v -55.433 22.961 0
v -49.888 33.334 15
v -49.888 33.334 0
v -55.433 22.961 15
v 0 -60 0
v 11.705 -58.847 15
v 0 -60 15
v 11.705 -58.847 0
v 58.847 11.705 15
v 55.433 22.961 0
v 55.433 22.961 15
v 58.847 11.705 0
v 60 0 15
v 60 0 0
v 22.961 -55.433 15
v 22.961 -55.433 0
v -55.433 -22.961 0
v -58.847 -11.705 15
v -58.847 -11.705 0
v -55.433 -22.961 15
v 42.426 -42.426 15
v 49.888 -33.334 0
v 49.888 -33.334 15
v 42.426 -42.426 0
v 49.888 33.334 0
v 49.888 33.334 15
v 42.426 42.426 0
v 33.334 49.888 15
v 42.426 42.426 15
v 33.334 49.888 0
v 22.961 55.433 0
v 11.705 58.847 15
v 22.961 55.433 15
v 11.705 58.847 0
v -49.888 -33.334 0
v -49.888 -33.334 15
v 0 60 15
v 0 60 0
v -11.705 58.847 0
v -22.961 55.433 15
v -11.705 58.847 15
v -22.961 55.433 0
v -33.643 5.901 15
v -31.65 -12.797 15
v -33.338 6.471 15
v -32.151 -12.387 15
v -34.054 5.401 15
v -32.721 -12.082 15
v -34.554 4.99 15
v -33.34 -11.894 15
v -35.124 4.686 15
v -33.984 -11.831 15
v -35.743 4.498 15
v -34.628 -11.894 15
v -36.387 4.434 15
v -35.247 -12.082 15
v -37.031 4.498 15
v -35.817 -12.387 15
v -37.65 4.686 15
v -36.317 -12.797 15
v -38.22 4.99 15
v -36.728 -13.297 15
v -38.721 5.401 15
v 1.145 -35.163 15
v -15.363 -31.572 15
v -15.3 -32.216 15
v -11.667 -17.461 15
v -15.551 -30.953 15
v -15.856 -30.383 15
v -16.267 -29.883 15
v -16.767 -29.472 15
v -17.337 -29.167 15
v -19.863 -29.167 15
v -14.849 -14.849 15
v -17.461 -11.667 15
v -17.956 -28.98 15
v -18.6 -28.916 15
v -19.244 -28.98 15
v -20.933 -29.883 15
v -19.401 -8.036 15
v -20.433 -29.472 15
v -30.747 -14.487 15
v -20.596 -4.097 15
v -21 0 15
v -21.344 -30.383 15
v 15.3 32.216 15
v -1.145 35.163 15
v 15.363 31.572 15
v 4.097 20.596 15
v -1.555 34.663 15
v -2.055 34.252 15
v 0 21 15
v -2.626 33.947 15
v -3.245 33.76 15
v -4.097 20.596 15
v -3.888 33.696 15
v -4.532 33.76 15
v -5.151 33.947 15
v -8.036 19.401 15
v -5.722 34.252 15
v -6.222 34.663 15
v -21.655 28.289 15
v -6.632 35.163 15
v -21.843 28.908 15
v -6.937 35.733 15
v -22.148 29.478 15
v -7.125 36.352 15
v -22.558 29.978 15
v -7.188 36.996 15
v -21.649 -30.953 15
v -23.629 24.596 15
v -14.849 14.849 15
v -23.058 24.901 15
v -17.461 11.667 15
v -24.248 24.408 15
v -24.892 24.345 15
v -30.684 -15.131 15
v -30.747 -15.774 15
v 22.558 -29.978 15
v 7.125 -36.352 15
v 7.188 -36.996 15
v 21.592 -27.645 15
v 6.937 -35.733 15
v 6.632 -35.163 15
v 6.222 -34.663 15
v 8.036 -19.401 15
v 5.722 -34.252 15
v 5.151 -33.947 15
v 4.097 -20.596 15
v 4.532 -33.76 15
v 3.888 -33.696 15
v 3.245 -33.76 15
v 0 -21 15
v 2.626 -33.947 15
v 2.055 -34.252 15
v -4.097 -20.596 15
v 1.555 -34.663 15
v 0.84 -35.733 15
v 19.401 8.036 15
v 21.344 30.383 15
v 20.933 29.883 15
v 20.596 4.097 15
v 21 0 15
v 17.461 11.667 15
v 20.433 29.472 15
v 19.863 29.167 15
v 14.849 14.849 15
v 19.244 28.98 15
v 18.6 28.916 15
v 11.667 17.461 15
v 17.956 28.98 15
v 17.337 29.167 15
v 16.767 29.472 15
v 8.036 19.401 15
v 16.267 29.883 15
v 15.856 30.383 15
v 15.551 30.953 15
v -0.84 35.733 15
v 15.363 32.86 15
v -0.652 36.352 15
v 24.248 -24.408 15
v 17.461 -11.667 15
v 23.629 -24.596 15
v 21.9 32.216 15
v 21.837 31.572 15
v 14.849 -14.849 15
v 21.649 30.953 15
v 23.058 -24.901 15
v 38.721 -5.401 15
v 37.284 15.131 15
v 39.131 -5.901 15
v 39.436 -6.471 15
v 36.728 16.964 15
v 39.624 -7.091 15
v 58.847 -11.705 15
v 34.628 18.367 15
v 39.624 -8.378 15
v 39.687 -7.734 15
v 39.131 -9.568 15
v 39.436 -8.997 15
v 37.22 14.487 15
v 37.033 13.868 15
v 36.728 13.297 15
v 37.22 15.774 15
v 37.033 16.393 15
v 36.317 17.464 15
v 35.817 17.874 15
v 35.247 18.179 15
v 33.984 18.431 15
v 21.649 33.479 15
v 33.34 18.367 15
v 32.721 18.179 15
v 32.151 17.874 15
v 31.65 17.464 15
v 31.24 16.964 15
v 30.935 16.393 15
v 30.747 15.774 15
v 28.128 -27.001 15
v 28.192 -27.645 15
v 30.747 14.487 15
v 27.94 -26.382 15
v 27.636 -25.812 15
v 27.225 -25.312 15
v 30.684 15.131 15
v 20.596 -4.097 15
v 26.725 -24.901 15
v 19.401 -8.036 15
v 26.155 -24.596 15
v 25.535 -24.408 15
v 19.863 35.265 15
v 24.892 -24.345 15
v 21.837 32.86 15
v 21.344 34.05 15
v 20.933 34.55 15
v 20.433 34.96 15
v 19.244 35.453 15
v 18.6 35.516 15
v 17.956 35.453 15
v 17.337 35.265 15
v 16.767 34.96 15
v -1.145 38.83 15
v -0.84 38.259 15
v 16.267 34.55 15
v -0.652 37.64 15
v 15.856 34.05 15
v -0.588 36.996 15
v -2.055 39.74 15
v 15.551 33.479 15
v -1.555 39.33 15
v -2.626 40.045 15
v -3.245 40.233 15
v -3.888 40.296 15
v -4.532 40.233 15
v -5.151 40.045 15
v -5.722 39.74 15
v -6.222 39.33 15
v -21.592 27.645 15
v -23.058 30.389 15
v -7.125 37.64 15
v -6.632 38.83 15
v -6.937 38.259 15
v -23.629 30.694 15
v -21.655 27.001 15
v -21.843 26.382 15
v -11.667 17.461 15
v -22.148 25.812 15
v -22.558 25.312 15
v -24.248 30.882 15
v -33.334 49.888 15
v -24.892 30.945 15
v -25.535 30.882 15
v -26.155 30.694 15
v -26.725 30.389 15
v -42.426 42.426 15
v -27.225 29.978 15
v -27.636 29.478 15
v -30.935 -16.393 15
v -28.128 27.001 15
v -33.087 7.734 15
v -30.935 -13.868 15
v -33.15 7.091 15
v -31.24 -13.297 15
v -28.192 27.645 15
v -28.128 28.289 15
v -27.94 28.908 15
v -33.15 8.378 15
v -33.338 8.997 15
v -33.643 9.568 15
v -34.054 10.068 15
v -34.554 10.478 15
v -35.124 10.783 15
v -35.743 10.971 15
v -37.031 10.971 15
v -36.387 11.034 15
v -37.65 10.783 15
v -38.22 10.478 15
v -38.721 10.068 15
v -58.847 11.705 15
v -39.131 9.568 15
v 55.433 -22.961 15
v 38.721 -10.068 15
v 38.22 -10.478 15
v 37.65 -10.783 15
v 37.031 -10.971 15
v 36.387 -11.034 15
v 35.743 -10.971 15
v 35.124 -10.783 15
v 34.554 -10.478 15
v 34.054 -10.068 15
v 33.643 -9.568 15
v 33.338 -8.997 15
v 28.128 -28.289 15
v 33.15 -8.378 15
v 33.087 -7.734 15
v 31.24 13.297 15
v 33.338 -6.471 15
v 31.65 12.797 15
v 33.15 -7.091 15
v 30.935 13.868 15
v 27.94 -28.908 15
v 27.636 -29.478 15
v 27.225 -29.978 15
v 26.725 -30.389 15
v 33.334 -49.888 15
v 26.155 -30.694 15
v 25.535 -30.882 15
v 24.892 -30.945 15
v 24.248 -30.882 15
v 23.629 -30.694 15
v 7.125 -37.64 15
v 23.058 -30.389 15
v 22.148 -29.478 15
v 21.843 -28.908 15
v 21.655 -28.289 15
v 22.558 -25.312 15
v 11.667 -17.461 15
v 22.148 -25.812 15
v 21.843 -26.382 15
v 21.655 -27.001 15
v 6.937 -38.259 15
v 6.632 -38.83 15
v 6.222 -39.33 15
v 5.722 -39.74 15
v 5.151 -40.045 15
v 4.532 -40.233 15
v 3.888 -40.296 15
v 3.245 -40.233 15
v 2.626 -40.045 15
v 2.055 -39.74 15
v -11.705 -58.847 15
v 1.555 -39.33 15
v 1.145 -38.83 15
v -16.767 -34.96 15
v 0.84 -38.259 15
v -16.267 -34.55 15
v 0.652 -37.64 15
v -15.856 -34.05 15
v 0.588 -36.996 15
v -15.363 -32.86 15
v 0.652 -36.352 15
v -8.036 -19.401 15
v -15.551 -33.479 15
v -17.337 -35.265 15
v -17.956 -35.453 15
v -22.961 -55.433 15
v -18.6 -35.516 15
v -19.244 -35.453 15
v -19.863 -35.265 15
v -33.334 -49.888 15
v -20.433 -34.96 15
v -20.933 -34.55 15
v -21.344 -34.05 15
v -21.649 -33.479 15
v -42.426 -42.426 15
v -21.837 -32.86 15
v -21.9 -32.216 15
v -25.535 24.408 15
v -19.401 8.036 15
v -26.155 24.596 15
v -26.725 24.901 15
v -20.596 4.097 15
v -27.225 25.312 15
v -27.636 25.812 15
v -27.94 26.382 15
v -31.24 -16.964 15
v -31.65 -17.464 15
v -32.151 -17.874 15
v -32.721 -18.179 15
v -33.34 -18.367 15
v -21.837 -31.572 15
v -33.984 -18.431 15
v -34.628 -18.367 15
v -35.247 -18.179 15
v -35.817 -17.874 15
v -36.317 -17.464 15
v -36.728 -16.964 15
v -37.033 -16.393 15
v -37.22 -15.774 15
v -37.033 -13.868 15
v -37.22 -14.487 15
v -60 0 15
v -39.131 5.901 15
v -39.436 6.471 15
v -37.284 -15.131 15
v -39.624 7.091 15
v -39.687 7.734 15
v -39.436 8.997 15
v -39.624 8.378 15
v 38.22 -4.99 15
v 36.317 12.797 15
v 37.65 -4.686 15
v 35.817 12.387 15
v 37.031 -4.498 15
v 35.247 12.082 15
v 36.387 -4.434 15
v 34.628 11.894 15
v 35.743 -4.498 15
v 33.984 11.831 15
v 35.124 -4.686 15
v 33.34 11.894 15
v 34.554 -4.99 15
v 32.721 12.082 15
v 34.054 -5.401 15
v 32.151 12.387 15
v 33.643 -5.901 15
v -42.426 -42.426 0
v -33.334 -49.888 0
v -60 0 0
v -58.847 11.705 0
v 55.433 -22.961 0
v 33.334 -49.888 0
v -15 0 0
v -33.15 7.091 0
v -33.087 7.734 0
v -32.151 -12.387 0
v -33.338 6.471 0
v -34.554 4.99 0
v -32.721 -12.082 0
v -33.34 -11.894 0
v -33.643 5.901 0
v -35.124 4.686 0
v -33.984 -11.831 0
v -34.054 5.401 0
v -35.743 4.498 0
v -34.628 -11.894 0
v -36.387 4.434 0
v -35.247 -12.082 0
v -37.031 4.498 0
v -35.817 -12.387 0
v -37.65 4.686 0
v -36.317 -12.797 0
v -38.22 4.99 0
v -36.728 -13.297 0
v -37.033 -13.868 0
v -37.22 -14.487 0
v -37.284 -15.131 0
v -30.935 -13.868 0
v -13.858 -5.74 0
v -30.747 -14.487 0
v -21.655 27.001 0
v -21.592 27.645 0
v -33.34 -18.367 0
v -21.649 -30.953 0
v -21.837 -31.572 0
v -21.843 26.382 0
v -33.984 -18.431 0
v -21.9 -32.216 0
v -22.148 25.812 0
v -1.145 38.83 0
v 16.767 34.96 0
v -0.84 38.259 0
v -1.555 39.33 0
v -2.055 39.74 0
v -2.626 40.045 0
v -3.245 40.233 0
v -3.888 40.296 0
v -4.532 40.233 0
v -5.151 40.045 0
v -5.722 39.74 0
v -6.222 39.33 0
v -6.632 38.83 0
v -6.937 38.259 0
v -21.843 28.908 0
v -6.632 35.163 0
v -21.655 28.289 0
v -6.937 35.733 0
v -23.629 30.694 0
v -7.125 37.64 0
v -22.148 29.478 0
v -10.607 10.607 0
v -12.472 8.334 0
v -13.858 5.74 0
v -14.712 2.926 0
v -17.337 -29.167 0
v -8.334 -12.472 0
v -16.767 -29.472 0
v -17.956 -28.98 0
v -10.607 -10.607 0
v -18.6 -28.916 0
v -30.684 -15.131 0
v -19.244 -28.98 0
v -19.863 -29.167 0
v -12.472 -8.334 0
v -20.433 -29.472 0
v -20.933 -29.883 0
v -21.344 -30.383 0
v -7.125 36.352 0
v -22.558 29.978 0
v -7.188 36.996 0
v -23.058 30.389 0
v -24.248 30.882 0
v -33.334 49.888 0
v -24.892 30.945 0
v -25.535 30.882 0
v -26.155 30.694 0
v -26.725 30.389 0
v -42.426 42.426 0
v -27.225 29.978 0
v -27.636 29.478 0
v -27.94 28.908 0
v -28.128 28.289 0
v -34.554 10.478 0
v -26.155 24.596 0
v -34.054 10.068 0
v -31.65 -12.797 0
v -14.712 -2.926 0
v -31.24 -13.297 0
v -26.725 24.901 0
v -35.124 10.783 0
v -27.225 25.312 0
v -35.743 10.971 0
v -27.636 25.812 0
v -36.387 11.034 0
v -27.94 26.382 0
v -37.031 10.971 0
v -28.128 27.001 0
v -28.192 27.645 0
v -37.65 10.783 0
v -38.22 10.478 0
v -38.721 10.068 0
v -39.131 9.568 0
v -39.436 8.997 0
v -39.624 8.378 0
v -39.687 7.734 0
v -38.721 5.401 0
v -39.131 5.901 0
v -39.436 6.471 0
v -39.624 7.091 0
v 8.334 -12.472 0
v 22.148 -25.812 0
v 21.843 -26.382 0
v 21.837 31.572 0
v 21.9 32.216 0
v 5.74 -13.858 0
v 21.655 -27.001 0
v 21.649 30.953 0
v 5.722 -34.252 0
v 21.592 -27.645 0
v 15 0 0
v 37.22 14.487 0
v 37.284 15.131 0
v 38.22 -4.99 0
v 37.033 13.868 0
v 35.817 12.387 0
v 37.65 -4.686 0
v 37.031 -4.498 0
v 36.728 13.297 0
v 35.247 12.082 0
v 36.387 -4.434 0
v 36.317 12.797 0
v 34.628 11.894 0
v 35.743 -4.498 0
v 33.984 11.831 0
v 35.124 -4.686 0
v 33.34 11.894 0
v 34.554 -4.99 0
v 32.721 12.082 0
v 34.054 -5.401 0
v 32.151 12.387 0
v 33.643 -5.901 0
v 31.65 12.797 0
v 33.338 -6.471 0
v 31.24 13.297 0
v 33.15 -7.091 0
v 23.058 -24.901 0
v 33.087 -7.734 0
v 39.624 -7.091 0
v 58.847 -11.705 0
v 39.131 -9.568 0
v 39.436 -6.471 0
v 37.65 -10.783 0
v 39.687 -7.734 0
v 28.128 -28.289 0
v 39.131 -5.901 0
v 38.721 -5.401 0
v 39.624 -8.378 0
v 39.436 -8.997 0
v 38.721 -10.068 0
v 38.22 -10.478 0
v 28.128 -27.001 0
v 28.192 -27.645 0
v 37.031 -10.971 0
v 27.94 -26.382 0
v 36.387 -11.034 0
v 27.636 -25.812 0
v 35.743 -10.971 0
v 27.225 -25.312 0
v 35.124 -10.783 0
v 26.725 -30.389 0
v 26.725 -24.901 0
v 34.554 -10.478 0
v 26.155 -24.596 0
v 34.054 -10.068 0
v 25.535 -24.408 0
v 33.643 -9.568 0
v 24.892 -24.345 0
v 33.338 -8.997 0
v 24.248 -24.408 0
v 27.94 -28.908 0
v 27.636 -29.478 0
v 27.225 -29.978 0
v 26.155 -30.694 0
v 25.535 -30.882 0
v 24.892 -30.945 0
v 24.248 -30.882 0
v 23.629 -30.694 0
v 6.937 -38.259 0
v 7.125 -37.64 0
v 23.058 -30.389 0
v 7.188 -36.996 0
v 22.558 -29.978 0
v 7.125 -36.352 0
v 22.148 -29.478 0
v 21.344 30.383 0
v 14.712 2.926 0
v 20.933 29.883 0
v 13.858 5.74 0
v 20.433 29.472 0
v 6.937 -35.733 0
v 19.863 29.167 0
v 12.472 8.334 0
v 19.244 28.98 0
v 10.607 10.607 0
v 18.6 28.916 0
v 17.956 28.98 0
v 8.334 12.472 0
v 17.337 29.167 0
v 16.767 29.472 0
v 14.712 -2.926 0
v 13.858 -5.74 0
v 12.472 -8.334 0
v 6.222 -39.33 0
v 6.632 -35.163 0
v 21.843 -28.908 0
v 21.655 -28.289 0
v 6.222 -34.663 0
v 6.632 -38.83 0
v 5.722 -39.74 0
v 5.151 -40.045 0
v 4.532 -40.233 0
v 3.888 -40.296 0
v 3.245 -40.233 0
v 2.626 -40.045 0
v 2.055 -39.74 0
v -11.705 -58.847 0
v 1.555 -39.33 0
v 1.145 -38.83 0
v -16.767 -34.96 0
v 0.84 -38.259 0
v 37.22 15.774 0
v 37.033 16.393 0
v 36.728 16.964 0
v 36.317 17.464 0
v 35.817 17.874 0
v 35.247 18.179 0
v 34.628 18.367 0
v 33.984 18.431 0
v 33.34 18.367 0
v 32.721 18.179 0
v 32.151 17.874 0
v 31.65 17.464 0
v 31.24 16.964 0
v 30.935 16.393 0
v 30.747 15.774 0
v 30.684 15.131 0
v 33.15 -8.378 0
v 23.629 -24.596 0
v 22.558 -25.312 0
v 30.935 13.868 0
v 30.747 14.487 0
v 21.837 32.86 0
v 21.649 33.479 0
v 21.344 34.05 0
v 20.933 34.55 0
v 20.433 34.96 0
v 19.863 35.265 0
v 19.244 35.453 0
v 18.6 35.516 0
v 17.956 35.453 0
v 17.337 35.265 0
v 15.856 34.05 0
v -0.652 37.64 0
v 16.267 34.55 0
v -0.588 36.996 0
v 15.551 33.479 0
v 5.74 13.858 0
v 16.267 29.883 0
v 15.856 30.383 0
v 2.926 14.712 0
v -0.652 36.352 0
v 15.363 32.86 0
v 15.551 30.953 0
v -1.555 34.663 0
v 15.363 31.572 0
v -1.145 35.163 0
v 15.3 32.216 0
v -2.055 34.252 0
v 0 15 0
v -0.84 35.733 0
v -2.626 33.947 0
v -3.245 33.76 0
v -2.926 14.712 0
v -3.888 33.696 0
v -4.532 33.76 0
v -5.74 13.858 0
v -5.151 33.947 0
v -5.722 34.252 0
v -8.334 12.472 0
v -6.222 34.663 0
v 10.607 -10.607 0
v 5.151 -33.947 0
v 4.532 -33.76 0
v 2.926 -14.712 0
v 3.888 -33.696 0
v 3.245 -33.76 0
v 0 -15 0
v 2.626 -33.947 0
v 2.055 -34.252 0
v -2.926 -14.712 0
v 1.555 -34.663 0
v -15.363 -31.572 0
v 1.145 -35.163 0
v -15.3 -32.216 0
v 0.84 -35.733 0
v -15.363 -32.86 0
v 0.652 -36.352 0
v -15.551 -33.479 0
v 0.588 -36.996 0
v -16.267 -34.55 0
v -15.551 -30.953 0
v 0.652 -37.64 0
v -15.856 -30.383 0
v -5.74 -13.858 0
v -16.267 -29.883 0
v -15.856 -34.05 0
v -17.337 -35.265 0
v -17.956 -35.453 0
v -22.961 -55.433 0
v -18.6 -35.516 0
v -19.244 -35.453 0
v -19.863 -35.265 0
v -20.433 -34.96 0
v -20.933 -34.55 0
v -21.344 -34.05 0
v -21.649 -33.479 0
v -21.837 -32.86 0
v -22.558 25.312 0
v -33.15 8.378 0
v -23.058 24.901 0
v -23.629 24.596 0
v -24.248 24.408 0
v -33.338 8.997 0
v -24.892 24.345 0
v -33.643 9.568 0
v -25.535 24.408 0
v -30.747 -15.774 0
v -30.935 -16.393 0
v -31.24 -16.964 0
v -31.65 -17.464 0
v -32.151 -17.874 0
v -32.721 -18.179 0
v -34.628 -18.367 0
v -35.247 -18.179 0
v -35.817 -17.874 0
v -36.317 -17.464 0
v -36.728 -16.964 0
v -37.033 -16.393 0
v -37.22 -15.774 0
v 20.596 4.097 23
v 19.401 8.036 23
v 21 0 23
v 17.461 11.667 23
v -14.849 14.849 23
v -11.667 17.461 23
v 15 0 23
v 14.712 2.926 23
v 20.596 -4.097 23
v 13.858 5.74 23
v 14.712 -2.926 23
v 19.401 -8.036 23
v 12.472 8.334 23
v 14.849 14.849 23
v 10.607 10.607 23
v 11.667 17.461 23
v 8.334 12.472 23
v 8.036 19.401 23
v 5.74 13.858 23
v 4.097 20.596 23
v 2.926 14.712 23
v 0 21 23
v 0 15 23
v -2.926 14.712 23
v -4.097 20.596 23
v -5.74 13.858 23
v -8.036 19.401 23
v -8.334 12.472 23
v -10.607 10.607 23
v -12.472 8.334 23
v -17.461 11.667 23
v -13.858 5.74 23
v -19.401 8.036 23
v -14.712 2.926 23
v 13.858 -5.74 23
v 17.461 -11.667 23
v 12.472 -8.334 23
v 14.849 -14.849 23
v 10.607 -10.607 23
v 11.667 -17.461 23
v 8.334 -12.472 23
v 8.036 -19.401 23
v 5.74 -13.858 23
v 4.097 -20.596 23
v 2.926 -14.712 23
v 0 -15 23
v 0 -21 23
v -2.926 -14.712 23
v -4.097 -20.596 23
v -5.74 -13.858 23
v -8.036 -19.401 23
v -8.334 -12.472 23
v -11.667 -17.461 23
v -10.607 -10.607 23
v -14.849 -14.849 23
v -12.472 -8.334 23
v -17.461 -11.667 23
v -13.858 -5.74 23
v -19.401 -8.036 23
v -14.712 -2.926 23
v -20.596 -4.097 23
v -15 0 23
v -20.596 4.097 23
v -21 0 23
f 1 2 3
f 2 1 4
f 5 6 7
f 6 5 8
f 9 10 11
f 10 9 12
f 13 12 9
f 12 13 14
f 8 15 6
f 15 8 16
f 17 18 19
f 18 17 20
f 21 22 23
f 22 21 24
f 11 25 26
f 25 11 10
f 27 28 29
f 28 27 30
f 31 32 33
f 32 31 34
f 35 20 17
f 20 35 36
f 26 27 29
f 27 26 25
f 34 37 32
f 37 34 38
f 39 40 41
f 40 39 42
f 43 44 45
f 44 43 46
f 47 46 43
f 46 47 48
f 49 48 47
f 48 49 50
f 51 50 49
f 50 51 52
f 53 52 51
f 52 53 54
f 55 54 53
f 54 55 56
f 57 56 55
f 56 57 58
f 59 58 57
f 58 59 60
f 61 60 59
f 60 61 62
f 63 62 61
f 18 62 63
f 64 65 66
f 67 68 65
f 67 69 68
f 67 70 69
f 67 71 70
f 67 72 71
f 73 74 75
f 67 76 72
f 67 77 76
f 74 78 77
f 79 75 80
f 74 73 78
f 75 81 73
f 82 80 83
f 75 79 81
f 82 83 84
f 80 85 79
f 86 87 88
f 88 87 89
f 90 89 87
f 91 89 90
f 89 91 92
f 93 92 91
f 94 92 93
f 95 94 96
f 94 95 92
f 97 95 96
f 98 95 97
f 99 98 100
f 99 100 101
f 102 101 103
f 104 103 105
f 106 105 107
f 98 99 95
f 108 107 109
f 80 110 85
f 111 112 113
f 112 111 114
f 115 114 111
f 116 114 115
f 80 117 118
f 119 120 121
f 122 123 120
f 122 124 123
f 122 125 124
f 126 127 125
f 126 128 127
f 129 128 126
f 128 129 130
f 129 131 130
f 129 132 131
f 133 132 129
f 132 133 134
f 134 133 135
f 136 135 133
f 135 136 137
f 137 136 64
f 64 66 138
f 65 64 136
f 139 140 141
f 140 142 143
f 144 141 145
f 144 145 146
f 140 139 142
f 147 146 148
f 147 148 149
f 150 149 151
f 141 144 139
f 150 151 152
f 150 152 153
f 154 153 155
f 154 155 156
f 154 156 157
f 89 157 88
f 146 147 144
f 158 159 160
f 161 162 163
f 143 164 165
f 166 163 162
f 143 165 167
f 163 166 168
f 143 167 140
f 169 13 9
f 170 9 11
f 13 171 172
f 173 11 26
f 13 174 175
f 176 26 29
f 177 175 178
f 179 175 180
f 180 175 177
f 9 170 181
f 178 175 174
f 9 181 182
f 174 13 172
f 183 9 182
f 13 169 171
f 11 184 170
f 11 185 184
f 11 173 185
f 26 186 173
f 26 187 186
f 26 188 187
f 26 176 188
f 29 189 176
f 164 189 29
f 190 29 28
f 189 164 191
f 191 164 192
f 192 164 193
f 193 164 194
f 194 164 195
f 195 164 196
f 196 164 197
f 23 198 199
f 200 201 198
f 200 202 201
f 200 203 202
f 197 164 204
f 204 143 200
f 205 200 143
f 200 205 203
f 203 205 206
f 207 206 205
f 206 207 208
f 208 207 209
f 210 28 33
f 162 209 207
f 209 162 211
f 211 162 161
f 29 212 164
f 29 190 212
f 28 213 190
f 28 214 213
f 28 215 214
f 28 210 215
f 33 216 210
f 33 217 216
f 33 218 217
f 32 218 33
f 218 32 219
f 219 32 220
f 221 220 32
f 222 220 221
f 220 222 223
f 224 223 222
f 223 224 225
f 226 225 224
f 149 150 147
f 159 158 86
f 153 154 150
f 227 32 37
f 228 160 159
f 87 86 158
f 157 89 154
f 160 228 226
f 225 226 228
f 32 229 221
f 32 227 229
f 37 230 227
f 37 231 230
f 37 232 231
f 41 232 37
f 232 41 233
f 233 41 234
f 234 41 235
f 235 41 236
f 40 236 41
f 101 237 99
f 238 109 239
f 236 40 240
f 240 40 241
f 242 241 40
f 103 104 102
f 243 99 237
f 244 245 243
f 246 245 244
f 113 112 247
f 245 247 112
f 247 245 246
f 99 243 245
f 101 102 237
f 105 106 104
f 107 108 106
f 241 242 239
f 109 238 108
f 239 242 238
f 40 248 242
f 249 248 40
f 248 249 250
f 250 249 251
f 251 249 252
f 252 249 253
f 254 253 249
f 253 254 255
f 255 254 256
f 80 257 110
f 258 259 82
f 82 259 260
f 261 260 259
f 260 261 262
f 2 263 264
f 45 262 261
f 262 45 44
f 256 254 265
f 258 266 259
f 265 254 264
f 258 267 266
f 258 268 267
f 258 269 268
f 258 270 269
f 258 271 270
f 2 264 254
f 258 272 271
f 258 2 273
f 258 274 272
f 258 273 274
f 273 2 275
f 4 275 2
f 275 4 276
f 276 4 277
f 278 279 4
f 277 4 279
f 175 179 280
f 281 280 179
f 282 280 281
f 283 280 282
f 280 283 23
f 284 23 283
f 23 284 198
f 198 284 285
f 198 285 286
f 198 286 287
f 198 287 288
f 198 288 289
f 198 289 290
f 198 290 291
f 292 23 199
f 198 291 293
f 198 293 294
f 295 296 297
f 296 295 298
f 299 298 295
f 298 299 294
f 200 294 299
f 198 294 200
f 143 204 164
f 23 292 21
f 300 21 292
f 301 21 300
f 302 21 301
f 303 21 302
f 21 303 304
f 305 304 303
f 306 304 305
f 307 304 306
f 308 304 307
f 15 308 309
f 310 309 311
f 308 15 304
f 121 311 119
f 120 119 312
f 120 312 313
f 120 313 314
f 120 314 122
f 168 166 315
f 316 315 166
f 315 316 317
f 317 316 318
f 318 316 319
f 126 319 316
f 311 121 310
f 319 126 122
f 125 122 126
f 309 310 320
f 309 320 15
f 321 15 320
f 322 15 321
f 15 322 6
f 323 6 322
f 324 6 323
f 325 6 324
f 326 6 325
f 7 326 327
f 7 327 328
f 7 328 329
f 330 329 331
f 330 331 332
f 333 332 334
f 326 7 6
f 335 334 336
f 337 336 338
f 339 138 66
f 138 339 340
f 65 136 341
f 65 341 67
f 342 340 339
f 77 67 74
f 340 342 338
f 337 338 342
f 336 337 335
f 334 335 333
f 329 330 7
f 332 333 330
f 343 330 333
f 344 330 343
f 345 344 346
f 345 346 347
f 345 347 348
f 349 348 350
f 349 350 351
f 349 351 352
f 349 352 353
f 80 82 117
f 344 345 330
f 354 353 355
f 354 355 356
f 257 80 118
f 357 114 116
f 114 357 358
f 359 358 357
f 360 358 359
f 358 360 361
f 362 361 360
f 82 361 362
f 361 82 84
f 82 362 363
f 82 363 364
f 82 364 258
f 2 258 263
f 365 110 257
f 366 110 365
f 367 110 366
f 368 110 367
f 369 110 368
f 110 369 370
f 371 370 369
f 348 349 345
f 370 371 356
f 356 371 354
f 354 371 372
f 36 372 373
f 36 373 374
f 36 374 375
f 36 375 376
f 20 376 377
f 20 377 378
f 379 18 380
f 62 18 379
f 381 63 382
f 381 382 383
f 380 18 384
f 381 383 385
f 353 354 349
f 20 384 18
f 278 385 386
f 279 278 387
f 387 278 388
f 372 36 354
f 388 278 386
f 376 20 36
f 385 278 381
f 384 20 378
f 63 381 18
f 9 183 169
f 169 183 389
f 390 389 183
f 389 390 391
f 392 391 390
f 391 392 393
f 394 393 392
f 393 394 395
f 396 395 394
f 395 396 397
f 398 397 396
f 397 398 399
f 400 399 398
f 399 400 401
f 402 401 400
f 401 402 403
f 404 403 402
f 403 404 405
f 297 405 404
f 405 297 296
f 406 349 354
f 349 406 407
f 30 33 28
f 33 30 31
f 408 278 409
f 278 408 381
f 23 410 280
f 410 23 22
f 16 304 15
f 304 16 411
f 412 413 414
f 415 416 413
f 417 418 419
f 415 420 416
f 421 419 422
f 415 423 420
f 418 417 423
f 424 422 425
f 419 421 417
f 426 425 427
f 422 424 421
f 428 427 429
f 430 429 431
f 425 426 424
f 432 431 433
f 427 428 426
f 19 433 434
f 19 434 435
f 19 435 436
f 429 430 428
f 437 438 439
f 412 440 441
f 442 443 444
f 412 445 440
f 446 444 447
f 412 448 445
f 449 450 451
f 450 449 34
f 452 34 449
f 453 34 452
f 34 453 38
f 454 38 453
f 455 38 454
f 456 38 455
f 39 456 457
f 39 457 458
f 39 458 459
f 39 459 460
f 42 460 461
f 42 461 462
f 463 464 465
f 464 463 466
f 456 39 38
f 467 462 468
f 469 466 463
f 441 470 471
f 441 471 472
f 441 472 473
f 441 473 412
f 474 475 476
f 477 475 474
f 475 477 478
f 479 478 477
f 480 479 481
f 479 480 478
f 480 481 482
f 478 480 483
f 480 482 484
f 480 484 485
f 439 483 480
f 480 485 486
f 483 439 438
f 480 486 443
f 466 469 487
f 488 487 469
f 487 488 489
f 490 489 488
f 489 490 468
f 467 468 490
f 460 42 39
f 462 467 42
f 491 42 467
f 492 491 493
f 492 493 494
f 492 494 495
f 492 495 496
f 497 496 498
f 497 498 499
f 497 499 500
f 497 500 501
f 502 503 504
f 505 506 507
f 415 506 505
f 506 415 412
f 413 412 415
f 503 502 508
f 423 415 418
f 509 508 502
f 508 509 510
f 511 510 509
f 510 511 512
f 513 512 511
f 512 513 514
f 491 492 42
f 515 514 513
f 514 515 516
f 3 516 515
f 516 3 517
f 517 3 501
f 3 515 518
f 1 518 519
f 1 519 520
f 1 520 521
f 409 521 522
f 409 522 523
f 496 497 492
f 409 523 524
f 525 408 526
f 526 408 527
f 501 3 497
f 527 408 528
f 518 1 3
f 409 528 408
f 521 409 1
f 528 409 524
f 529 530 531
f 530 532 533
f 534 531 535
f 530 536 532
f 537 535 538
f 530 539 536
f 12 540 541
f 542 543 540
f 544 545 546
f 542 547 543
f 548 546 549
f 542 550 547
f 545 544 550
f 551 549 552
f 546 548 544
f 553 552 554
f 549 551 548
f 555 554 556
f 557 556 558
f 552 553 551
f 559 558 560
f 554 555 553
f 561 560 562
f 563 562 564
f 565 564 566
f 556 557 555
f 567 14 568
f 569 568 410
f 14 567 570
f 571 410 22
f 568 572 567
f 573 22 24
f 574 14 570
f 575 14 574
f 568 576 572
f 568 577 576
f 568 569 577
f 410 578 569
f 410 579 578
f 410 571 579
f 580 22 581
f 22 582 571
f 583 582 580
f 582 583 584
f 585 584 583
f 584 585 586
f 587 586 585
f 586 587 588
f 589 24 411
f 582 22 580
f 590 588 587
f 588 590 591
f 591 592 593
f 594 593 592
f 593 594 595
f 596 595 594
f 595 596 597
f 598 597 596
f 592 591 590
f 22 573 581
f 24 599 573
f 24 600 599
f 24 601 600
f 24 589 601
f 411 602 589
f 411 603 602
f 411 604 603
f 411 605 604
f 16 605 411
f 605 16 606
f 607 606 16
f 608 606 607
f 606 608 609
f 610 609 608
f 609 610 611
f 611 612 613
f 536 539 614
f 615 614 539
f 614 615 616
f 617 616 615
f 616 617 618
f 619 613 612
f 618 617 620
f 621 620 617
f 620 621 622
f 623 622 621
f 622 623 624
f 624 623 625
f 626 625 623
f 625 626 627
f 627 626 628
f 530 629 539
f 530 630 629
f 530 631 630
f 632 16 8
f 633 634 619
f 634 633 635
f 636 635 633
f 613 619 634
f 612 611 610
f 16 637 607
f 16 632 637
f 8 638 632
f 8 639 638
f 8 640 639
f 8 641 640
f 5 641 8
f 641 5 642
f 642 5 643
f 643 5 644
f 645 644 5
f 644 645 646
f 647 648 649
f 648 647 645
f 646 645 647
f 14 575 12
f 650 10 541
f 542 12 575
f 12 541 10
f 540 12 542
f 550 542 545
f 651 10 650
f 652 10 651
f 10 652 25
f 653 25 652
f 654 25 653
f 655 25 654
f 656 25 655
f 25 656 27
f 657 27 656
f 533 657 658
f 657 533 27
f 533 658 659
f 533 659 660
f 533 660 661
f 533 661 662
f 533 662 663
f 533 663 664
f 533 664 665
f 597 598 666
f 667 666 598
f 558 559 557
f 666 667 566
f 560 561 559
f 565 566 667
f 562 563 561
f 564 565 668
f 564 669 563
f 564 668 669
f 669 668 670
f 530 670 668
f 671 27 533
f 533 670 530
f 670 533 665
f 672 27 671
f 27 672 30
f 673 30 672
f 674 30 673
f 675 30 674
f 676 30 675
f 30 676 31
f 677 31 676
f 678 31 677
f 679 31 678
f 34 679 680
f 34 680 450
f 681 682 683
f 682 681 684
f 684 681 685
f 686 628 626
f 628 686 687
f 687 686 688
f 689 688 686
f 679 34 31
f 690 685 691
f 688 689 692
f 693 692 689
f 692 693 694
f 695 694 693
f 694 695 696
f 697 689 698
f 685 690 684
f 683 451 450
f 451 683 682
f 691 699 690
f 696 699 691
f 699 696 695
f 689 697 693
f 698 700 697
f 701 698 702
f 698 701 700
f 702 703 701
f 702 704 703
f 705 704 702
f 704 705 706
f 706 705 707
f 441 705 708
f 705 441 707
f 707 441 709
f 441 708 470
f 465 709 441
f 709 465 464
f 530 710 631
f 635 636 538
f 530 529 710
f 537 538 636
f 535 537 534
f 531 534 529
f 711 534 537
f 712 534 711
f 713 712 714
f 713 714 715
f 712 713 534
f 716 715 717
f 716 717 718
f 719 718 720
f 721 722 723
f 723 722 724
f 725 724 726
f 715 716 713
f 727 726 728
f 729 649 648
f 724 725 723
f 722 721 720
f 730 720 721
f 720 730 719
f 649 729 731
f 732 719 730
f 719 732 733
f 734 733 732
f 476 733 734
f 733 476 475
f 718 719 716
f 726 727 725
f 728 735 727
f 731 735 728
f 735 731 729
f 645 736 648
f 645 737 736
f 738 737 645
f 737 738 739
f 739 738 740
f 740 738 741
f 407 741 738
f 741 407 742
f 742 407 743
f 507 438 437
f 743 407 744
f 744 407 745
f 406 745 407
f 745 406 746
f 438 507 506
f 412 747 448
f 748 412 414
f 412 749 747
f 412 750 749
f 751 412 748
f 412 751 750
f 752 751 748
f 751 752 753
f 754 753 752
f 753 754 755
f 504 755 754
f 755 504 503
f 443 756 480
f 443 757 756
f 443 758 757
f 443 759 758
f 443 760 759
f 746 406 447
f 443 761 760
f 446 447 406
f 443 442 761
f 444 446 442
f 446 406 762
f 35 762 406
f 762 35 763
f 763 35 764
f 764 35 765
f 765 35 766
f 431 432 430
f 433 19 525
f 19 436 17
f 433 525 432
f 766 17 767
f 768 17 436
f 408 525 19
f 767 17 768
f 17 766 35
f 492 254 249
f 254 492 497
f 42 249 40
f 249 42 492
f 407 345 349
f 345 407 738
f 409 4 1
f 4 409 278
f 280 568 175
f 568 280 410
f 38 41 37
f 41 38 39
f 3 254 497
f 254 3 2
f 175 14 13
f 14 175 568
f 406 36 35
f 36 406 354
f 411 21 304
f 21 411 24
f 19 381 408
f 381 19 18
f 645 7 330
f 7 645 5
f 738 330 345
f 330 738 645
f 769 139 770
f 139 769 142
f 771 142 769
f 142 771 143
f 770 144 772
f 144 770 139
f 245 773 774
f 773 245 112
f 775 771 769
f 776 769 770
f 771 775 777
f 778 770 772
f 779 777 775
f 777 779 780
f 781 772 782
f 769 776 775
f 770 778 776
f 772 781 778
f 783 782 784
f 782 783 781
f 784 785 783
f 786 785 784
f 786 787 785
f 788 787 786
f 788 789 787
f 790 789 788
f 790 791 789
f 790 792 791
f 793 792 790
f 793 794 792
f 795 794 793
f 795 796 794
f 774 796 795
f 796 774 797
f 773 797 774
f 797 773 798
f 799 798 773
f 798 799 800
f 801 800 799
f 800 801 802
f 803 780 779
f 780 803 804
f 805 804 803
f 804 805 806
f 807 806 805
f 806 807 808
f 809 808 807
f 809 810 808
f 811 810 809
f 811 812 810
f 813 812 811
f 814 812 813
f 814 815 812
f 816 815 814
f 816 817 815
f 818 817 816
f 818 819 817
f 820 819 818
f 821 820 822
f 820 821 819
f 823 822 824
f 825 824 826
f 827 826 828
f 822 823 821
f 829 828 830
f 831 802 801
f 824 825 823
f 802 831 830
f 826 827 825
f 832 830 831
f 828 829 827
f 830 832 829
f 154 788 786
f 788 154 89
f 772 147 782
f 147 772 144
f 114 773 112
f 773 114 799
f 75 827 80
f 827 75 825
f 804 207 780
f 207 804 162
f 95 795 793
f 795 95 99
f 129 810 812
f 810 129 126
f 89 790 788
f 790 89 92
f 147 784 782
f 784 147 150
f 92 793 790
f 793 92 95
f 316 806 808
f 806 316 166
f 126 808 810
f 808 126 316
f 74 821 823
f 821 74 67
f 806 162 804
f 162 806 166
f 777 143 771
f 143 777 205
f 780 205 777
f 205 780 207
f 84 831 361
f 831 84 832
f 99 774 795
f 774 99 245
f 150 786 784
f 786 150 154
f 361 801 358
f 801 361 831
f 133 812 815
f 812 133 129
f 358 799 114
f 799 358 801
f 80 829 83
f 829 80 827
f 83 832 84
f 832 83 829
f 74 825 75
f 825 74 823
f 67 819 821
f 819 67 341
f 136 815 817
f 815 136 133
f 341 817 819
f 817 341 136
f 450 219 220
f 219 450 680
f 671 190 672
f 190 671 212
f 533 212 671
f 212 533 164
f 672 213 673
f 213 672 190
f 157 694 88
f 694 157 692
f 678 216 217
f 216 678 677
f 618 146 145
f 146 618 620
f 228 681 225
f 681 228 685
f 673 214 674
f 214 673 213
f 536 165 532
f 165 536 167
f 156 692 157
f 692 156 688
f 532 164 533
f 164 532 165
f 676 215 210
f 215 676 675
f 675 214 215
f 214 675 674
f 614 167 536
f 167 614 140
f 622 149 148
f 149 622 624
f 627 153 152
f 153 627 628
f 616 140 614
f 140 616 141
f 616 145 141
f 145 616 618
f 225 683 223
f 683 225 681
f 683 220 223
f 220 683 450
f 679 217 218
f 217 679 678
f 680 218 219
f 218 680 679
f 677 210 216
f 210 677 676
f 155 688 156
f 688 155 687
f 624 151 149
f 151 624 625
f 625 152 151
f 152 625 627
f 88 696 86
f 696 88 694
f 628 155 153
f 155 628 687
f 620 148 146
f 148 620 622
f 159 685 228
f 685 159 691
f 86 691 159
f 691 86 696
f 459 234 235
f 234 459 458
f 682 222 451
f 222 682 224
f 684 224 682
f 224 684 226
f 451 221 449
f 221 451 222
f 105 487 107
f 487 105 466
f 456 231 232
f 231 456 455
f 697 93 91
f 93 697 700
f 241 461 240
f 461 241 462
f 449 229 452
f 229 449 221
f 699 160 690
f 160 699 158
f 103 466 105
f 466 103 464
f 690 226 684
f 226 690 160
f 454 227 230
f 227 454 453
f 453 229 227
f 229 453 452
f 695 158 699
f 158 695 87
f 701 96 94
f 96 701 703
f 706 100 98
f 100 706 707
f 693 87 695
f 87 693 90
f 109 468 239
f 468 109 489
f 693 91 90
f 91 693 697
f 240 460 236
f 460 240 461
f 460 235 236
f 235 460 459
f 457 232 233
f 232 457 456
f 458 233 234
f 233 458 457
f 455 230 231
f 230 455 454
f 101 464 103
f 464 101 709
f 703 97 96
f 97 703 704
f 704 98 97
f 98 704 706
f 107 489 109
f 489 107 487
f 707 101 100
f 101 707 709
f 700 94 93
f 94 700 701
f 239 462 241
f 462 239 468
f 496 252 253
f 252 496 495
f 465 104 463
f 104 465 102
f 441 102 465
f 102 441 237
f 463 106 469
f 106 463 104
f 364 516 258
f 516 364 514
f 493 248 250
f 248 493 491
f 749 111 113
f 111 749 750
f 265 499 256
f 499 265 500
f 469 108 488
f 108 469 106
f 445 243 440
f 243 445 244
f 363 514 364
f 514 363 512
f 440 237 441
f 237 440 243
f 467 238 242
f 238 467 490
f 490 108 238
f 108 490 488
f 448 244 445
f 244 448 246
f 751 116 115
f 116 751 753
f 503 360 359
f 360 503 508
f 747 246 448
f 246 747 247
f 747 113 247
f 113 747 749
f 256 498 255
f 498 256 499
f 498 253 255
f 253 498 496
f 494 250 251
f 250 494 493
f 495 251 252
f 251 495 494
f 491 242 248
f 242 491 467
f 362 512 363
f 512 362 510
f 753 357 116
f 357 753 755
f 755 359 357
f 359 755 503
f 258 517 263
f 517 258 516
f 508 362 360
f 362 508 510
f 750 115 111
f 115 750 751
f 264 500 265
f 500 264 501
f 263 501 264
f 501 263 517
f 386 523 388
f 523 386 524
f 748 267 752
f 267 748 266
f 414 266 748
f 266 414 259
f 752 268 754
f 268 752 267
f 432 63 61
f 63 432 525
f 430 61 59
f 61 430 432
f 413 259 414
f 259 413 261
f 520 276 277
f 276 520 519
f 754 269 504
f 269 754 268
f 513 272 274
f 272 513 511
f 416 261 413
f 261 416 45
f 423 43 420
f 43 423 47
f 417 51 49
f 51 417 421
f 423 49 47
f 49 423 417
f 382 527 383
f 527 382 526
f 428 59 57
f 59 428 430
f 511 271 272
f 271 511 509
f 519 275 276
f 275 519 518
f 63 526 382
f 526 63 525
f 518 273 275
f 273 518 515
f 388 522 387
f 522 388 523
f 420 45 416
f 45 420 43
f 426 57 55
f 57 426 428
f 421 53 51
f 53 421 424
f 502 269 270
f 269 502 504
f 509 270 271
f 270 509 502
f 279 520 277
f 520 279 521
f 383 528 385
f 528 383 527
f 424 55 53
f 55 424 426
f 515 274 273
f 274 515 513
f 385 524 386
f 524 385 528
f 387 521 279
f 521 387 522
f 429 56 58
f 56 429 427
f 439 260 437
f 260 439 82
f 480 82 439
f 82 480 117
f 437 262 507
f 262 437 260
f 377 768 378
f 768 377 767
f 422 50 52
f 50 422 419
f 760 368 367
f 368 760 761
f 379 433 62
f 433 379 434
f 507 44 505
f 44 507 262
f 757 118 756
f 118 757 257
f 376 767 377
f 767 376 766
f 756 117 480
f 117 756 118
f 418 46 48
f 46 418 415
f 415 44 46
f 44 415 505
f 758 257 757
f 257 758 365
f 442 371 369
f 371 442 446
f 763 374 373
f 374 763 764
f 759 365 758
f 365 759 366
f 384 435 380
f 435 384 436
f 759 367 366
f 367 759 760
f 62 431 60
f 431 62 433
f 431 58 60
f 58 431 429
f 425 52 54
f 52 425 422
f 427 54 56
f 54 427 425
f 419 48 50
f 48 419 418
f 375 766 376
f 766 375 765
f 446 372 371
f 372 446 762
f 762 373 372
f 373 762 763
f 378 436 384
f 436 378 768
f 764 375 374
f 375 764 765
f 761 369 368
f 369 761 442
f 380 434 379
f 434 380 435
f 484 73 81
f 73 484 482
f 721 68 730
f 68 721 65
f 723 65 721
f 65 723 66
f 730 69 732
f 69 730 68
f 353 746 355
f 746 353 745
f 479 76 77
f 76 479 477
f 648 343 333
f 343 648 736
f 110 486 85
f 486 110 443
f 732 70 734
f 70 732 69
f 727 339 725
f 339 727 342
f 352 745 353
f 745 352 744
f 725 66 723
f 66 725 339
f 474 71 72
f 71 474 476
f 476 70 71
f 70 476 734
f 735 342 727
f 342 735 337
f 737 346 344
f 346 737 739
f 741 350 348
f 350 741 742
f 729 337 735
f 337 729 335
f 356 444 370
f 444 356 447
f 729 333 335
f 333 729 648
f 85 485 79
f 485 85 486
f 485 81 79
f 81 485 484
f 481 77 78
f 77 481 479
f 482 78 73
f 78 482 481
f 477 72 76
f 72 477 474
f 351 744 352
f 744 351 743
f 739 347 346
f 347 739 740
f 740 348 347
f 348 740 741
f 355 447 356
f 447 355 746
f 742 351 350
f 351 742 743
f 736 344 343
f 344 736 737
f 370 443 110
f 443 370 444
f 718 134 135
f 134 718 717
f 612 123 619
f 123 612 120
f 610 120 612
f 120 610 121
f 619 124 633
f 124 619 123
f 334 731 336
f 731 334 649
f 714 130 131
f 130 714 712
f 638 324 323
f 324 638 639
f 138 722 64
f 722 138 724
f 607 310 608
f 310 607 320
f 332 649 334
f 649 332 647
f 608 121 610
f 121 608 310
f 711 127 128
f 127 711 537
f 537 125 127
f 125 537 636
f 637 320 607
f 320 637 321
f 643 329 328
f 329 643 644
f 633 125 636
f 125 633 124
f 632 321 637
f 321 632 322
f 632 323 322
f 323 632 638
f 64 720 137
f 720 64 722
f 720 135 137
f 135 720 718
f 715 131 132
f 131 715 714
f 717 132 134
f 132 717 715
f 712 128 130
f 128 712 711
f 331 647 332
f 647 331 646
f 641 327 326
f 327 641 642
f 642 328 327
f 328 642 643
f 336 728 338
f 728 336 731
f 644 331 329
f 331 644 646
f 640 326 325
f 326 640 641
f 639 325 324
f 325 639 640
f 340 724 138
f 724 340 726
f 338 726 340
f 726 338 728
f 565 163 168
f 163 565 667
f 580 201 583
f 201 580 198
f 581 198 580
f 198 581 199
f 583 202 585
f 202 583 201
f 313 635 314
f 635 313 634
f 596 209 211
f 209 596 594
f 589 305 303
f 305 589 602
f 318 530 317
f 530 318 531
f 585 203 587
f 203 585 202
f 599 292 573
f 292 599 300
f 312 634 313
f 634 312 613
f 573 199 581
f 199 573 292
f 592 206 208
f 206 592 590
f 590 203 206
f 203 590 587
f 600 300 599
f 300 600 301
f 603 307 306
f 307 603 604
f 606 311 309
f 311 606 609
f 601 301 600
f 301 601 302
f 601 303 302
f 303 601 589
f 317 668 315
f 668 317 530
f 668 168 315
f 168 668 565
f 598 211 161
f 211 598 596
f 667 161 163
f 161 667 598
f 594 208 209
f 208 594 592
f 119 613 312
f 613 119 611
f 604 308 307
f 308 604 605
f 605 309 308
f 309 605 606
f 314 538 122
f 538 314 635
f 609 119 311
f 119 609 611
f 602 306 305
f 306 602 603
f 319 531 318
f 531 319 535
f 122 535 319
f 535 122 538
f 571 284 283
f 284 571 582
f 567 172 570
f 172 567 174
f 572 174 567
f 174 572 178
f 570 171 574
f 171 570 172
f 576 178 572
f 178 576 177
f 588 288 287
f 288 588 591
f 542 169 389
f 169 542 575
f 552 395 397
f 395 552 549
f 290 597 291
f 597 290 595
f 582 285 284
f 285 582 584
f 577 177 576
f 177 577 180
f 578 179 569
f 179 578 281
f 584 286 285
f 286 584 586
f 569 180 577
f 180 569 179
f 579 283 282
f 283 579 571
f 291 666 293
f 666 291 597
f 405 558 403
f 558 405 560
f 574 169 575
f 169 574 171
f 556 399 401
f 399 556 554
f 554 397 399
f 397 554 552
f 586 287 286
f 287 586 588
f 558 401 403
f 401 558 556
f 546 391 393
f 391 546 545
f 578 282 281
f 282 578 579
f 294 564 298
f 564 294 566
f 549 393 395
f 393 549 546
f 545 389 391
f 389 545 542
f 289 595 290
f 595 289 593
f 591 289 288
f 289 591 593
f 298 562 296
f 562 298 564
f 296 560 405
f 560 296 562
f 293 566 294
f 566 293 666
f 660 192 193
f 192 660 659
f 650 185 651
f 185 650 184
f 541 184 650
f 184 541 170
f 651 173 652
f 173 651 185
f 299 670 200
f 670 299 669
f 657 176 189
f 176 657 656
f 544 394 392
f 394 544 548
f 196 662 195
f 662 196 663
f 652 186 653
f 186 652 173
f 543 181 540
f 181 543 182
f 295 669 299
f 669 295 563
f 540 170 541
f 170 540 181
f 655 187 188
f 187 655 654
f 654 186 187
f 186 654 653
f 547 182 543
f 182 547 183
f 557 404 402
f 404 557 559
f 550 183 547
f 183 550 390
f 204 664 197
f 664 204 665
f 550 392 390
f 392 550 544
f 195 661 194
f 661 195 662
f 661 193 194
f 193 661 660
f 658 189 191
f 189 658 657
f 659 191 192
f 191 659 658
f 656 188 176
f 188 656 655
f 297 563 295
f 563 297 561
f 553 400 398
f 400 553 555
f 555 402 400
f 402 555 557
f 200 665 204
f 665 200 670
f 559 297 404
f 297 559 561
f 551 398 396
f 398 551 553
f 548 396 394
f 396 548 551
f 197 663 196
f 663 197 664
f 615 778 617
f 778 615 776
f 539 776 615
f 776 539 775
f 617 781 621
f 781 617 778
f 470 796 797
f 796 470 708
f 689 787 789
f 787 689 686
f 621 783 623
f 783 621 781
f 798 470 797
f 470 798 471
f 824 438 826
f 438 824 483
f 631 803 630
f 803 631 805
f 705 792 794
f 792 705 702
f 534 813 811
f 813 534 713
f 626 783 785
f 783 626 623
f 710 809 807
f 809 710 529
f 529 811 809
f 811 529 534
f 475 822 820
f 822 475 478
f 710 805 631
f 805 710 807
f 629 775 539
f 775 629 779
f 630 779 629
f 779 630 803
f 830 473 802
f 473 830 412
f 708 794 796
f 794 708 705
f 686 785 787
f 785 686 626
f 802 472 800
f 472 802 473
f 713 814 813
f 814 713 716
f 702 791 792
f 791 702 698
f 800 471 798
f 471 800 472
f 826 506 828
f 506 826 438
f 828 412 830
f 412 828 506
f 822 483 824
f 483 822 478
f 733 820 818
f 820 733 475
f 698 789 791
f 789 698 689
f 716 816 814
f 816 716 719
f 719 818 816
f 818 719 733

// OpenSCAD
$fn = 32;

// ----------------------------------------------------------------------
// Flange Ø120 x 15
// 10 holes on a Ø74.4 bolt circle, bolted joints
// ----------------------------------------------------------------------

// --- parameters (mm) ---
flange_d = 120;  // outside diameter of the flange
thickness = 15;  // flange thickness
holes = 10;      // number of bolt holes
pcd = 74.4;      // bolt circle diameter
start_deg = 60;  // angle of the first hole, from +X
hole_d = 6.6;    // bolt hole diameter
bore_d = 30;     // central through bore
hub_d = 42;      // hub outside diameter
hub_h = 8;       // hub height above the flange face (0 = no hub)

// --- derived feature positions (mm) ---
height = thickness + hub_h;  // = 23   overall height of the part
pcd_r = pcd / 2;             // = 37.2   bolt circle radius
hole_step = 360 / holes;     // = 36   angular pitch
feature_centers = [
  [pcd_r * cos(start_deg + 0 * hole_step), pcd_r * sin(start_deg + 0 * hole_step)],
  [pcd_r * cos(start_deg + 1 * hole_step), pcd_r * sin(start_deg + 1 * hole_step)],
  [pcd_r * cos(start_deg + 2 * hole_step), pcd_r * sin(start_deg + 2 * hole_step)],
  [pcd_r * cos(start_deg + 3 * hole_step), pcd_r * sin(start_deg + 3 * hole_step)],
  [pcd_r * cos(start_deg + 4 * hole_step), pcd_r * sin(start_deg + 4 * hole_step)],
  [pcd_r * cos(start_deg + 5 * hole_step), pcd_r * sin(start_deg + 5 * hole_step)],
  [pcd_r * cos(start_deg + 6 * hole_step), pcd_r * sin(start_deg + 6 * hole_step)],
  [pcd_r * cos(start_deg + 7 * hole_step), pcd_r * sin(start_deg + 7 * hole_step)],
  [pcd_r * cos(start_deg + 8 * hole_step), pcd_r * sin(start_deg + 8 * hole_step)],
  [pcd_r * cos(start_deg + 9 * hole_step), pcd_r * sin(start_deg + 9 * hole_step)]
];   // bolt hole centres on the pitch circle

// flange disc, every hole and the bore cut straight through
difference() {
  union() {
    cylinder(d = flange_d, h = thickness);
    cylinder(d = hub_d, h = height);  // hub, overlapped into the flange
  }
  translate([0, 0, -1]) cylinder(d = bore_d, h = height + 2);  // bore, through
  for (centre = feature_centers)
    translate([centre[0], centre[1], -1]) cylinder(d = hole_d, h = thickness + 2);
}
